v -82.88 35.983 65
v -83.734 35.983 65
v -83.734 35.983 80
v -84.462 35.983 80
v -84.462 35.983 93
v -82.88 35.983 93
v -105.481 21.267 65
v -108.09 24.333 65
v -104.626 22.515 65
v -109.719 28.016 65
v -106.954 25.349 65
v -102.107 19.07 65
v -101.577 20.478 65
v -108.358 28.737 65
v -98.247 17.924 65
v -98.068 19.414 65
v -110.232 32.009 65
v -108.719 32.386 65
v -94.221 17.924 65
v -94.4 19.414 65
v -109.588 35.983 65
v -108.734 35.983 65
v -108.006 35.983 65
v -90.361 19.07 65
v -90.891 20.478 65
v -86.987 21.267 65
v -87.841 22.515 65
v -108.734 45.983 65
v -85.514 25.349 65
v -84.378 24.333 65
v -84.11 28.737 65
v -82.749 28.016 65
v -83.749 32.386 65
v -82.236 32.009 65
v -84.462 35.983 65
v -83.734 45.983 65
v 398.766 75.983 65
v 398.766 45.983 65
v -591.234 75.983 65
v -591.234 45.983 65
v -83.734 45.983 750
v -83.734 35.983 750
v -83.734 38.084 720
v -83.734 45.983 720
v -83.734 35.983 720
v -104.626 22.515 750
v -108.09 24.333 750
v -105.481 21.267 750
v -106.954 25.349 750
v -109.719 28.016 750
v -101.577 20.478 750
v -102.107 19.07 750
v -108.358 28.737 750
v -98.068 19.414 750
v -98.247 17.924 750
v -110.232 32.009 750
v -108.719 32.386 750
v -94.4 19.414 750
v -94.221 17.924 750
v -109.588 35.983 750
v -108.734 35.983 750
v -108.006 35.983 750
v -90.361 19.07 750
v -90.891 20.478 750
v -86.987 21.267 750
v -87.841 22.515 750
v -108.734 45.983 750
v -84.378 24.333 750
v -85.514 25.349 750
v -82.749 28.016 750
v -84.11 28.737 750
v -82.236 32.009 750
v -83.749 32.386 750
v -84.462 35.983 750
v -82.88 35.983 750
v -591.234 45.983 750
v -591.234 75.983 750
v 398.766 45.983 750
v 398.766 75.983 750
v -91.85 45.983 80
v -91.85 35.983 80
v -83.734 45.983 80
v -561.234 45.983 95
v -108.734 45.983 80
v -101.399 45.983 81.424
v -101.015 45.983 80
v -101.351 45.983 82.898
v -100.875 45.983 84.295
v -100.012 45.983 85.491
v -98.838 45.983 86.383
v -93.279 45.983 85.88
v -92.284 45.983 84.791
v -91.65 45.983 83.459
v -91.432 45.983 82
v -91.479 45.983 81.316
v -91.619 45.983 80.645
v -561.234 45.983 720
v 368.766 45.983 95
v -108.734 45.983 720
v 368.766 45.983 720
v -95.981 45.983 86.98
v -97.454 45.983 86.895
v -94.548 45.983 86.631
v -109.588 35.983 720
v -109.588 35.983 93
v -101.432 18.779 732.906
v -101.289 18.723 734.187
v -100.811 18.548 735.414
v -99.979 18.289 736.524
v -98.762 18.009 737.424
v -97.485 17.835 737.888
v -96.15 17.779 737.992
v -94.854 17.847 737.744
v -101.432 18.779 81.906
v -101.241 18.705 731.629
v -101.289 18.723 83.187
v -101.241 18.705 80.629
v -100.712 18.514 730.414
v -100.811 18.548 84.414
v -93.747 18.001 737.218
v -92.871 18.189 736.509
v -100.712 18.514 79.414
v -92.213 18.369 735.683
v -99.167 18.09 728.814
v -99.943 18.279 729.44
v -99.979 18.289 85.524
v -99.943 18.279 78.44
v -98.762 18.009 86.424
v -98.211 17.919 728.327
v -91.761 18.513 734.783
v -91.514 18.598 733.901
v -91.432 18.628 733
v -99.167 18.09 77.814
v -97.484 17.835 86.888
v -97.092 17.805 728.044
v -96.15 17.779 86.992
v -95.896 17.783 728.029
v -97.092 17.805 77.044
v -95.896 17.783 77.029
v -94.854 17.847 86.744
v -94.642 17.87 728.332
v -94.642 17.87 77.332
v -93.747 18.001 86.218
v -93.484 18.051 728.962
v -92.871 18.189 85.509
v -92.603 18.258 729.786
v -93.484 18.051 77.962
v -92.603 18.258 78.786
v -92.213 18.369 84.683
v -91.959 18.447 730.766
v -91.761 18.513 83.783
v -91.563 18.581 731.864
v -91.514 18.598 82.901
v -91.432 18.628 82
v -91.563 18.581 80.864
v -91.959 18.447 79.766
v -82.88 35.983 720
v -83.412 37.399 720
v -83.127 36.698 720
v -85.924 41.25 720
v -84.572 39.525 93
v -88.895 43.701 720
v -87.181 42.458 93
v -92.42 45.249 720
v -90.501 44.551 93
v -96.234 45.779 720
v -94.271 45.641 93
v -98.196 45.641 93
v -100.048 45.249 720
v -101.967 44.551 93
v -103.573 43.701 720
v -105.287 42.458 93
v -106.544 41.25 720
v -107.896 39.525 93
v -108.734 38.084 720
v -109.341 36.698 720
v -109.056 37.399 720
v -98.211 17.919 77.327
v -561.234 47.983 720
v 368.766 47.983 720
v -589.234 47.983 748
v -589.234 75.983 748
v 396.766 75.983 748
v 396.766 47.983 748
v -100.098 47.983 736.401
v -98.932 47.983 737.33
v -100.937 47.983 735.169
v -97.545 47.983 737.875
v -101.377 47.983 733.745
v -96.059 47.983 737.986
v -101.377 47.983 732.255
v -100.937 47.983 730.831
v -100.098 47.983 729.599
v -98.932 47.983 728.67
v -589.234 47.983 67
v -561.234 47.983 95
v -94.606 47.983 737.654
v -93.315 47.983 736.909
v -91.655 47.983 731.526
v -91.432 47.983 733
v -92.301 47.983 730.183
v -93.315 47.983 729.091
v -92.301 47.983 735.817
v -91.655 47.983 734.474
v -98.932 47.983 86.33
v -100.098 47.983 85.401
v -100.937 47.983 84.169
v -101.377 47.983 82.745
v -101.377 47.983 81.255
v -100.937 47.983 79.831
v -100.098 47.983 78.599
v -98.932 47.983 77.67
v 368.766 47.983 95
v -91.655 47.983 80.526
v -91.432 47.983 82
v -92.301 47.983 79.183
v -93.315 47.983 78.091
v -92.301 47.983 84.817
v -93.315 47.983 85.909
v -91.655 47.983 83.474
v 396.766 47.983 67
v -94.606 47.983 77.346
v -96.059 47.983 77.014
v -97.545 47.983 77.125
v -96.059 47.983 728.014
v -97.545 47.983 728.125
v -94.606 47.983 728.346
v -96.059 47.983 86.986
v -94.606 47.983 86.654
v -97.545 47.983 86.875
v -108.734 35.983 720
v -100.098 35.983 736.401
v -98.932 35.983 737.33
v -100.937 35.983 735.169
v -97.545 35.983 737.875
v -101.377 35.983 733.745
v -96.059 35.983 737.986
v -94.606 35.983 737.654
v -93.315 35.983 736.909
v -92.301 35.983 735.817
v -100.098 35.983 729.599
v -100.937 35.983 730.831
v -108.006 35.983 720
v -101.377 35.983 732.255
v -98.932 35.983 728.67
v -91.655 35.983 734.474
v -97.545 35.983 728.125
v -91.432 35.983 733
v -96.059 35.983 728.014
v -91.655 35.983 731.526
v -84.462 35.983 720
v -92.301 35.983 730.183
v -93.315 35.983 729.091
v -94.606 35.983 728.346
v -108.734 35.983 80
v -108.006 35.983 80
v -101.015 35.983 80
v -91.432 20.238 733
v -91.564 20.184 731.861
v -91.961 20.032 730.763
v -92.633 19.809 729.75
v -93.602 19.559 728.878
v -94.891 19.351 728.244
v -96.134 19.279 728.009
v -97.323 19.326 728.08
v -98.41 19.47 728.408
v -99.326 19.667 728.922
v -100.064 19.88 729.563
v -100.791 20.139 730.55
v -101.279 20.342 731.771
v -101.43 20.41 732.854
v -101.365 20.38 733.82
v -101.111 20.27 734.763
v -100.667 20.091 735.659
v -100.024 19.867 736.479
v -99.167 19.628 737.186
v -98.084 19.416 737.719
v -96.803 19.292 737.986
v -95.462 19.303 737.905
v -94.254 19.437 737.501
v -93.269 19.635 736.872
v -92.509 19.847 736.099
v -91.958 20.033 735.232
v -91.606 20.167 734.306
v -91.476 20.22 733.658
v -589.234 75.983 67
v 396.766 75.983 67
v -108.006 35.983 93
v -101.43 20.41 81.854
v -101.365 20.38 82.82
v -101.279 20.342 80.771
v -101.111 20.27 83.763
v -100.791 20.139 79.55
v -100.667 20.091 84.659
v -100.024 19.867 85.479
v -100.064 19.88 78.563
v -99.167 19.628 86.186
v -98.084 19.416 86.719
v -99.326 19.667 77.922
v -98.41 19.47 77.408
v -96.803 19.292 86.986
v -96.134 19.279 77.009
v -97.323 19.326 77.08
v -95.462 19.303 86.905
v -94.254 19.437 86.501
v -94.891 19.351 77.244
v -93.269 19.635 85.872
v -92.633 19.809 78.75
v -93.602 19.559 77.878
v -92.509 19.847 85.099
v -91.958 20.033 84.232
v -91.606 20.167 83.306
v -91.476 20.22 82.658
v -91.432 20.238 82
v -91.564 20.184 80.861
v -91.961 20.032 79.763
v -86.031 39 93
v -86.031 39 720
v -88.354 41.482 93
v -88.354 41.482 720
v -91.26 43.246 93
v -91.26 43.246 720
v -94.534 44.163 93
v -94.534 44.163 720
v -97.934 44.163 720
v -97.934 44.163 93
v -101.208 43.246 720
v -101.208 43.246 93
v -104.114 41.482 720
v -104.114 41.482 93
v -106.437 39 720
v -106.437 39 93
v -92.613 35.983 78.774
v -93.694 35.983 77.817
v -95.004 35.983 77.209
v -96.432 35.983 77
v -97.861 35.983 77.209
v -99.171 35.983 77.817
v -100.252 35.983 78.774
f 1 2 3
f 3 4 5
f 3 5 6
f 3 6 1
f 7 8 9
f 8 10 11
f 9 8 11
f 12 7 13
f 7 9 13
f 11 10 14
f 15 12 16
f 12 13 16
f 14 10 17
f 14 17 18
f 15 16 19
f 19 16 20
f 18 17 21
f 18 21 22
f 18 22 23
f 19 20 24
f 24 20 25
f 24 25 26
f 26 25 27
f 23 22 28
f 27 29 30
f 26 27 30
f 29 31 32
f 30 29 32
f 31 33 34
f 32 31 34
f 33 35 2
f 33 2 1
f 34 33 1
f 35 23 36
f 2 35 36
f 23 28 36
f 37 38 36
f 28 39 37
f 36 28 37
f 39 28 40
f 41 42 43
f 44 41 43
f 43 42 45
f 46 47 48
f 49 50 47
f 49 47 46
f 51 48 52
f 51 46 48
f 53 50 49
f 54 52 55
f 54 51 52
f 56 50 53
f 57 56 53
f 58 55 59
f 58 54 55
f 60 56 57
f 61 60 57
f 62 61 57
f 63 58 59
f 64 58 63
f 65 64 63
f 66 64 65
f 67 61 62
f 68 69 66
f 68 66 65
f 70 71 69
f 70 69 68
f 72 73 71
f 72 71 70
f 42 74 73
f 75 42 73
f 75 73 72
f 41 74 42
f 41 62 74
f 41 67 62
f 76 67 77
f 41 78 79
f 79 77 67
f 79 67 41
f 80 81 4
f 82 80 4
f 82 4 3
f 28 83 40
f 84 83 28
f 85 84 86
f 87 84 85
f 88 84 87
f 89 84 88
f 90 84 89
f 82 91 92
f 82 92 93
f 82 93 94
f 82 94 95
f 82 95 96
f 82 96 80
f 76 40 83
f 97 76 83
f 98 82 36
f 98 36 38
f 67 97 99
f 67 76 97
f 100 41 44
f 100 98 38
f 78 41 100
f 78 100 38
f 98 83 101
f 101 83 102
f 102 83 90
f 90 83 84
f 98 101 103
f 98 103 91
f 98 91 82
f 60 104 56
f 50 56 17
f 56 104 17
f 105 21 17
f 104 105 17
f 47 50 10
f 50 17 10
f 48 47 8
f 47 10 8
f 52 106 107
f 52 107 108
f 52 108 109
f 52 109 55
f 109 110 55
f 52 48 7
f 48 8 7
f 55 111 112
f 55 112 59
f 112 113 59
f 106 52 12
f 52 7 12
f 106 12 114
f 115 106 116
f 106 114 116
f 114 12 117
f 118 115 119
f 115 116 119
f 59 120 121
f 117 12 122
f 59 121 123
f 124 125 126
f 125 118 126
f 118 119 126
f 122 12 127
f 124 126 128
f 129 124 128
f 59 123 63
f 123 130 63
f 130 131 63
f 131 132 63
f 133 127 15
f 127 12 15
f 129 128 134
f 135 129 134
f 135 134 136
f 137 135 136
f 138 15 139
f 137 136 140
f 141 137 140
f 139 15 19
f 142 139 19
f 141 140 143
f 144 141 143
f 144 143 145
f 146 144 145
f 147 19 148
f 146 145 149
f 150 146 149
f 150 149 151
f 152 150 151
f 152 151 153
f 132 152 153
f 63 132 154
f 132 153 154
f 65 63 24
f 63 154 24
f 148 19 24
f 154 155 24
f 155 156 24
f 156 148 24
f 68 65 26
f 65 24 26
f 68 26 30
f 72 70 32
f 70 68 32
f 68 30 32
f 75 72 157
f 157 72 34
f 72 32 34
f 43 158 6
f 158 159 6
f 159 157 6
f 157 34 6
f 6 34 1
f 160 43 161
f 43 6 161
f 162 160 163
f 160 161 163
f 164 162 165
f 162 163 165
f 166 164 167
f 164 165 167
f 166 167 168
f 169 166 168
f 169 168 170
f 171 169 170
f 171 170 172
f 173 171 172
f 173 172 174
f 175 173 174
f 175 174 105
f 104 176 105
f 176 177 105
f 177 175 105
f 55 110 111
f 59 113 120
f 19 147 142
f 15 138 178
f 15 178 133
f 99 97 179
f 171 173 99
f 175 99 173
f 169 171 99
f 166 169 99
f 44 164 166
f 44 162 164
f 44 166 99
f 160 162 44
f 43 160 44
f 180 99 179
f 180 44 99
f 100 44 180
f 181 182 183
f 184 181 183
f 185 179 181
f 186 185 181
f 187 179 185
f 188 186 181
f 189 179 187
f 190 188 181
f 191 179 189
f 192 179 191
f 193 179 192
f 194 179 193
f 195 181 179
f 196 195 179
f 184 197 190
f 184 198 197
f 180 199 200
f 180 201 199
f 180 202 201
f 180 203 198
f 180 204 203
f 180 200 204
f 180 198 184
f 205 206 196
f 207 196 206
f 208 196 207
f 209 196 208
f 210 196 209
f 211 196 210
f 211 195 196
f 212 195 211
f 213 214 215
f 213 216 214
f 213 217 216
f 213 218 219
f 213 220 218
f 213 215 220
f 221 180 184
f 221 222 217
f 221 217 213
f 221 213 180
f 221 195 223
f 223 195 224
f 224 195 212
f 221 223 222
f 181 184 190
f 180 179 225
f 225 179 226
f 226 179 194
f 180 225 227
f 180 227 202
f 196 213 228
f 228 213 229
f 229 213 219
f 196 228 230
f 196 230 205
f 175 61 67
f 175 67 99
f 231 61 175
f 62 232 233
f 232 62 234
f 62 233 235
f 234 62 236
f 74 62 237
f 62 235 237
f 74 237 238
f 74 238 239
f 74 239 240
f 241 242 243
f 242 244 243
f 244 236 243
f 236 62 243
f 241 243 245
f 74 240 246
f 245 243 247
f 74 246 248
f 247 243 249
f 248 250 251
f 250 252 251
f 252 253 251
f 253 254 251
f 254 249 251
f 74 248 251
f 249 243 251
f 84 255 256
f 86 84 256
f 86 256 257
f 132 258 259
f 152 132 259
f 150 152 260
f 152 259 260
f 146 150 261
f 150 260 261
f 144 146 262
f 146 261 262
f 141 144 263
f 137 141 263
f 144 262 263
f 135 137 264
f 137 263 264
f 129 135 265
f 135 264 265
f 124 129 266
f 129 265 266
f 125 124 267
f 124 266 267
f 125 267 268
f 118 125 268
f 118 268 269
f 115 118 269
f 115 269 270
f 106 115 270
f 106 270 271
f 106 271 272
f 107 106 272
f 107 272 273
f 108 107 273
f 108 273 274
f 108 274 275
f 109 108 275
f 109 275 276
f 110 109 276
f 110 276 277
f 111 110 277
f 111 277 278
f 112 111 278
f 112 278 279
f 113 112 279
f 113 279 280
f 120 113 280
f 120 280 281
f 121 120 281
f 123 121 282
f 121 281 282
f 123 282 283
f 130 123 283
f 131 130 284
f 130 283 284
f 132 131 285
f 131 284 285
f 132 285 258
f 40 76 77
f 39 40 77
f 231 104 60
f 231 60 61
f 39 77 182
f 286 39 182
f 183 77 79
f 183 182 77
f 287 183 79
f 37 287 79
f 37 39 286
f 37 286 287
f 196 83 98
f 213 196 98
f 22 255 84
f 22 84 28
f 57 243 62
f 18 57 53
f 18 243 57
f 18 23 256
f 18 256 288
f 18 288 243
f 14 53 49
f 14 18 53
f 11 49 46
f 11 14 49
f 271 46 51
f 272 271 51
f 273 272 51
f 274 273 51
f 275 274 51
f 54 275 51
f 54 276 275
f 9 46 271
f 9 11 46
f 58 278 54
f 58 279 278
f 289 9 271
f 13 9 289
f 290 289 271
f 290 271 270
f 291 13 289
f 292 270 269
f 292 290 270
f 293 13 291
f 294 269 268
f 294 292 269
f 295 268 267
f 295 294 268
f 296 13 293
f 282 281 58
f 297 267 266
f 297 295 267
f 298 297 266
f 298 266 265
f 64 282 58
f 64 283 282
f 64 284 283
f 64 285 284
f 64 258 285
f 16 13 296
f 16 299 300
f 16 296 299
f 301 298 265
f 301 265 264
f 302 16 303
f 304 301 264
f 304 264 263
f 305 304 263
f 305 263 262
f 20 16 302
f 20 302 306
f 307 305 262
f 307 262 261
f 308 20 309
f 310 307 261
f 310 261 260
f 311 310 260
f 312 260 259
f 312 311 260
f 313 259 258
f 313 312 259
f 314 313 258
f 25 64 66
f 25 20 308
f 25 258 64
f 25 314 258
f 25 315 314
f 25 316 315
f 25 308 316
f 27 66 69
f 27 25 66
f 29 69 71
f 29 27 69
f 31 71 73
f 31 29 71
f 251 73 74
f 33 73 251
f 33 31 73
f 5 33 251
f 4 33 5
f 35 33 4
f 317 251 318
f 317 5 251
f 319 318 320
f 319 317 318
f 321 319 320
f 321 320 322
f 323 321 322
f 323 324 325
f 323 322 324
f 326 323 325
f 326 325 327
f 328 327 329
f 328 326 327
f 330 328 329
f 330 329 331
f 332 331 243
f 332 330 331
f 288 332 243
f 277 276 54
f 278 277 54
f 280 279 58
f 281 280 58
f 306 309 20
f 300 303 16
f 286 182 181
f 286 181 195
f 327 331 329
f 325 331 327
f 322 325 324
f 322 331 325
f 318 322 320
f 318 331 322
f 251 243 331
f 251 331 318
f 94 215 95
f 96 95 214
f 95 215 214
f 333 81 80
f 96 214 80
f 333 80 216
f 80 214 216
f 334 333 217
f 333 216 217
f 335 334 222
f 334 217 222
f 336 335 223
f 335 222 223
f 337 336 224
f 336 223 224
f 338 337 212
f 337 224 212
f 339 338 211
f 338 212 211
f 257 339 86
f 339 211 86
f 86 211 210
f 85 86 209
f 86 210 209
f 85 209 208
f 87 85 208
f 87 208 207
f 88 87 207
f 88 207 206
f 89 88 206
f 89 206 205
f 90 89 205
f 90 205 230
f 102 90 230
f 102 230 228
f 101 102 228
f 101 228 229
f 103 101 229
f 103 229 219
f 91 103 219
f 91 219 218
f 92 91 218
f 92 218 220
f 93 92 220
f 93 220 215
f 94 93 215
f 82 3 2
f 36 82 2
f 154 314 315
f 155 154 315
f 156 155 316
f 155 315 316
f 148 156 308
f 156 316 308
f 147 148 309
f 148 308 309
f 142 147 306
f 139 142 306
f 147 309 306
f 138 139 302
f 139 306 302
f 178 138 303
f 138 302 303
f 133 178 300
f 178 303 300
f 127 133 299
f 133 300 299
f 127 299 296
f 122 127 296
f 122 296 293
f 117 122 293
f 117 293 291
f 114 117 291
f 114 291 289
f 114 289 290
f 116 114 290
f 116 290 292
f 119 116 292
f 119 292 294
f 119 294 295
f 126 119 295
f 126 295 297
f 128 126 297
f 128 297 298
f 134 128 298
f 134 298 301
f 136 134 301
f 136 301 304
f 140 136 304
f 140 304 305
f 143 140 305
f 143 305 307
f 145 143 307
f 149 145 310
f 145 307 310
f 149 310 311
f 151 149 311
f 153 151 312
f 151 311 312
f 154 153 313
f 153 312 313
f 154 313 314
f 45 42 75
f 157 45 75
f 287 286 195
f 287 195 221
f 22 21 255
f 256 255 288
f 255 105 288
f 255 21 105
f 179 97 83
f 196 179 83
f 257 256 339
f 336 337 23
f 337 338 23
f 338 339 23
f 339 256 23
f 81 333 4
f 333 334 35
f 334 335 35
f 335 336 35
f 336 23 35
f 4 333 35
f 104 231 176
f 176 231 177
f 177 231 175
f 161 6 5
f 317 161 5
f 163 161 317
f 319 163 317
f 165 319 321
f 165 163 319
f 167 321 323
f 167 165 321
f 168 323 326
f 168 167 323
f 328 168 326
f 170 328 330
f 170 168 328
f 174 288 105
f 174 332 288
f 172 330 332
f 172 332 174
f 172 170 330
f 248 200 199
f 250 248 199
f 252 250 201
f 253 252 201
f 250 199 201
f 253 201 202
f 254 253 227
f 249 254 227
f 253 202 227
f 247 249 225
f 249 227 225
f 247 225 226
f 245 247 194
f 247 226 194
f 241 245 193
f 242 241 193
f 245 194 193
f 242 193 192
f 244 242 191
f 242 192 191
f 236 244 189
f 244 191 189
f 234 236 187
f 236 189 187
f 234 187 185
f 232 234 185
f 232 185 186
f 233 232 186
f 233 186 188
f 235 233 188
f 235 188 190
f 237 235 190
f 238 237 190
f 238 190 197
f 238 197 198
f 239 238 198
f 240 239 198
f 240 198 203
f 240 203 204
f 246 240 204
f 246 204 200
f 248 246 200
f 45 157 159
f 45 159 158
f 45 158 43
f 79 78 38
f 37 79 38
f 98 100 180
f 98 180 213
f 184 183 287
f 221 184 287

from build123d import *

# Parameters (mm, degrees)
SKETCH2_R            = 14
SKETCH2_R_2          = 12.5
BOSS_EXTRUDE3_DEPTH  = 800
SKETCH3_W            = 50.702600358
SKETCH3_H            = 14.280844995
CUT_EXTRUDE2_DEPTH   = 800
SKETCH5_W            = 25
SKETCH5_H            = 30
BOSS_EXTRUDE4_DEPTH  = 10
SKETCH7_W            = 990
SKETCH7_H            = 685
SKETCH7_W_2          = 930
SKETCH7_H_2          = 625
BOSS_EXTRUDE7_DEPTH  = 30
SKETCH8_W            = 986
SKETCH8_H            = 681
CUT_EXTRUDE3_DEPTH   = 28
SKETCH9_R            = 5
CUT_EXTRUDE4_DEPTH   = 40
SKETCH15_W           = 1140
SKETCH15_H           = 860
SKETCH15_W_2         = 980
SKETCH15_H_2         = 700
CUT_EXTRUDE6_DEPTH   = 149
SKETCH17_W           = 10
SKETCH17_H           = 2
BOSS_EXTRUDE11_DEPTH = 685
SKETCH20_W           = 25
SKETCH20_H           = 15
CUT_EXTRUDE7_DEPTH   = 38
SKETCH22_R           = 14
SKETCH22_R_2         = 12.5
BOSS_EXTRUDE13_DEPTH = 627
SKETCH23_W           = 59.046620232
SKETCH23_H           = 45.176343133
CUT_EXTRUDE8_DEPTH   = 627


with BuildPart() as part:
    # Sketch2 → Boss-Extrude3 (new body)
    with BuildSketch(Plane.XY):
        with Locations((-96.233955608, 31.778750266)):
            Circle(SKETCH2_R)
        with Locations((-96.233955608, 31.778750266)):
            Circle(SKETCH2_R_2, mode=Mode.SUBTRACT)
    extrude(amount=BOSS_EXTRUDE3_DEPTH)

    # Sketch3 → Cut-Extrude2 (cut)
    with BuildSketch(Plane.XY.offset(800)):
        with Locations((-97.127751448, 43.123650815)):
            Rectangle(SKETCH3_W, SKETCH3_H)
    extrude(amount=-CUT_EXTRUDE2_DEPTH, mode=Mode.SUBTRACT)

    # Sketch5 → Boss-Extrude4 (add)
    with BuildSketch(Plane(origin=(0, 35.983228318, 0), x_dir=(1, 0, 0), z_dir=(0, 1, 0))):
        with Locations((-96.233955608, -65)):
            Rectangle(SKETCH5_W, SKETCH5_H)
        with Locations((-96.233955608, -735)):
            Rectangle(SKETCH5_W, SKETCH5_H)
    extrude(amount=BOSS_EXTRUDE4_DEPTH)

    # Sketch7 → Boss-Extrude7 (add)
    with BuildSketch(Plane(origin=(0, 45.983228318, 0), x_dir=(1, 0, 0), z_dir=(0, 1, 0))):
        with Locations((-96.233955608, -407.5)):
            Rectangle(SKETCH7_W, SKETCH7_H)
        with Locations((-96.233955608, -407.5)):
            Rectangle(SKETCH7_W_2, SKETCH7_H_2, mode=Mode.SUBTRACT)
    extrude(amount=BOSS_EXTRUDE7_DEPTH)

    # Sketch8 → Cut-Extrude3 (cut)
    with BuildSketch(Plane(origin=(0, 75.983228318, 0), x_dir=(1, 0, 0), z_dir=(0, 1, 0))):
        with Locations((-96.233955608, -407.5)):
            Rectangle(SKETCH8_W, SKETCH8_H)
    extrude(amount=-CUT_EXTRUDE3_DEPTH, mode=Mode.SUBTRACT)

    # Sketch9 → Cut-Extrude4 (cut)
    with BuildSketch(Plane(origin=(0, 47.983228318, 0), x_dir=(1, 0, 0), z_dir=(0, 1, 0))):
        with Locations((-96.432449353, -82)):
            Circle(SKETCH9_R)
        with Locations((-96.432449353, -733)):
            Circle(SKETCH9_R)
    extrude(amount=-CUT_EXTRUDE4_DEPTH, mode=Mode.SUBTRACT)

    # Sketch15 → Cut-Extrude6 (cut)
    with BuildSketch(Plane(origin=(0, 47.983228318, 0), x_dir=(1, 0, 0), z_dir=(0, 1, 0))):
        with Locations((-91.233955608, -400)):
            Rectangle(SKETCH15_W, SKETCH15_H)
        with Locations((-91.233955608, -400)):
            Rectangle(SKETCH15_W_2, SKETCH15_H_2, mode=Mode.SUBTRACT)
    extrude(amount=-CUT_EXTRUDE6_DEPTH, mode=Mode.SUBTRACT)

    # Sketch17 → Boss-Extrude11 (add)
    with BuildSketch(Plane.XY.offset(750)):
        with Locations((-586.233955608, 46.983228318)):
            Rectangle(SKETCH17_W, SKETCH17_H)
    extrude(amount=-BOSS_EXTRUDE11_DEPTH)

    # Sketch20 → Cut-Extrude7 (cut)
    with BuildSketch(Plane(origin=(0, 45.983228318, 0), x_dir=(1, 0, 0), z_dir=(0, 1, 0))):
        with Locations((-96.233955608, -57.5)):
            Rectangle(SKETCH20_W, SKETCH20_H)
    extrude(amount=-CUT_EXTRUDE7_DEPTH, mode=Mode.SUBTRACT)

    # Sketch22 → Boss-Extrude13 (add)
    with BuildSketch(Plane(origin=(0, 0, 720), x_dir=(-1, 0, 0), z_dir=(0, 0, -1))):
        with Locations((96.233955608, 31.778750266)):
            Circle(SKETCH22_R)
        with Locations((96.233955608, 31.778750266)):
            Circle(SKETCH22_R_2, mode=Mode.SUBTRACT)
    extrude(amount=BOSS_EXTRUDE13_DEPTH)

    # Sketch23 → Cut-Extrude8 (cut)
    with BuildSketch(Plane(origin=(0, 47.983228318, 0), x_dir=(1, 0, 0), z_dir=(0, 1, 0))):
        with Locations((-102.636866369, -42.411828433)):
            Rectangle(SKETCH23_W, SKETCH23_H)
    extrude(amount=-CUT_EXTRUDE8_DEPTH, mode=Mode.SUBTRACT)


solid = part.part
